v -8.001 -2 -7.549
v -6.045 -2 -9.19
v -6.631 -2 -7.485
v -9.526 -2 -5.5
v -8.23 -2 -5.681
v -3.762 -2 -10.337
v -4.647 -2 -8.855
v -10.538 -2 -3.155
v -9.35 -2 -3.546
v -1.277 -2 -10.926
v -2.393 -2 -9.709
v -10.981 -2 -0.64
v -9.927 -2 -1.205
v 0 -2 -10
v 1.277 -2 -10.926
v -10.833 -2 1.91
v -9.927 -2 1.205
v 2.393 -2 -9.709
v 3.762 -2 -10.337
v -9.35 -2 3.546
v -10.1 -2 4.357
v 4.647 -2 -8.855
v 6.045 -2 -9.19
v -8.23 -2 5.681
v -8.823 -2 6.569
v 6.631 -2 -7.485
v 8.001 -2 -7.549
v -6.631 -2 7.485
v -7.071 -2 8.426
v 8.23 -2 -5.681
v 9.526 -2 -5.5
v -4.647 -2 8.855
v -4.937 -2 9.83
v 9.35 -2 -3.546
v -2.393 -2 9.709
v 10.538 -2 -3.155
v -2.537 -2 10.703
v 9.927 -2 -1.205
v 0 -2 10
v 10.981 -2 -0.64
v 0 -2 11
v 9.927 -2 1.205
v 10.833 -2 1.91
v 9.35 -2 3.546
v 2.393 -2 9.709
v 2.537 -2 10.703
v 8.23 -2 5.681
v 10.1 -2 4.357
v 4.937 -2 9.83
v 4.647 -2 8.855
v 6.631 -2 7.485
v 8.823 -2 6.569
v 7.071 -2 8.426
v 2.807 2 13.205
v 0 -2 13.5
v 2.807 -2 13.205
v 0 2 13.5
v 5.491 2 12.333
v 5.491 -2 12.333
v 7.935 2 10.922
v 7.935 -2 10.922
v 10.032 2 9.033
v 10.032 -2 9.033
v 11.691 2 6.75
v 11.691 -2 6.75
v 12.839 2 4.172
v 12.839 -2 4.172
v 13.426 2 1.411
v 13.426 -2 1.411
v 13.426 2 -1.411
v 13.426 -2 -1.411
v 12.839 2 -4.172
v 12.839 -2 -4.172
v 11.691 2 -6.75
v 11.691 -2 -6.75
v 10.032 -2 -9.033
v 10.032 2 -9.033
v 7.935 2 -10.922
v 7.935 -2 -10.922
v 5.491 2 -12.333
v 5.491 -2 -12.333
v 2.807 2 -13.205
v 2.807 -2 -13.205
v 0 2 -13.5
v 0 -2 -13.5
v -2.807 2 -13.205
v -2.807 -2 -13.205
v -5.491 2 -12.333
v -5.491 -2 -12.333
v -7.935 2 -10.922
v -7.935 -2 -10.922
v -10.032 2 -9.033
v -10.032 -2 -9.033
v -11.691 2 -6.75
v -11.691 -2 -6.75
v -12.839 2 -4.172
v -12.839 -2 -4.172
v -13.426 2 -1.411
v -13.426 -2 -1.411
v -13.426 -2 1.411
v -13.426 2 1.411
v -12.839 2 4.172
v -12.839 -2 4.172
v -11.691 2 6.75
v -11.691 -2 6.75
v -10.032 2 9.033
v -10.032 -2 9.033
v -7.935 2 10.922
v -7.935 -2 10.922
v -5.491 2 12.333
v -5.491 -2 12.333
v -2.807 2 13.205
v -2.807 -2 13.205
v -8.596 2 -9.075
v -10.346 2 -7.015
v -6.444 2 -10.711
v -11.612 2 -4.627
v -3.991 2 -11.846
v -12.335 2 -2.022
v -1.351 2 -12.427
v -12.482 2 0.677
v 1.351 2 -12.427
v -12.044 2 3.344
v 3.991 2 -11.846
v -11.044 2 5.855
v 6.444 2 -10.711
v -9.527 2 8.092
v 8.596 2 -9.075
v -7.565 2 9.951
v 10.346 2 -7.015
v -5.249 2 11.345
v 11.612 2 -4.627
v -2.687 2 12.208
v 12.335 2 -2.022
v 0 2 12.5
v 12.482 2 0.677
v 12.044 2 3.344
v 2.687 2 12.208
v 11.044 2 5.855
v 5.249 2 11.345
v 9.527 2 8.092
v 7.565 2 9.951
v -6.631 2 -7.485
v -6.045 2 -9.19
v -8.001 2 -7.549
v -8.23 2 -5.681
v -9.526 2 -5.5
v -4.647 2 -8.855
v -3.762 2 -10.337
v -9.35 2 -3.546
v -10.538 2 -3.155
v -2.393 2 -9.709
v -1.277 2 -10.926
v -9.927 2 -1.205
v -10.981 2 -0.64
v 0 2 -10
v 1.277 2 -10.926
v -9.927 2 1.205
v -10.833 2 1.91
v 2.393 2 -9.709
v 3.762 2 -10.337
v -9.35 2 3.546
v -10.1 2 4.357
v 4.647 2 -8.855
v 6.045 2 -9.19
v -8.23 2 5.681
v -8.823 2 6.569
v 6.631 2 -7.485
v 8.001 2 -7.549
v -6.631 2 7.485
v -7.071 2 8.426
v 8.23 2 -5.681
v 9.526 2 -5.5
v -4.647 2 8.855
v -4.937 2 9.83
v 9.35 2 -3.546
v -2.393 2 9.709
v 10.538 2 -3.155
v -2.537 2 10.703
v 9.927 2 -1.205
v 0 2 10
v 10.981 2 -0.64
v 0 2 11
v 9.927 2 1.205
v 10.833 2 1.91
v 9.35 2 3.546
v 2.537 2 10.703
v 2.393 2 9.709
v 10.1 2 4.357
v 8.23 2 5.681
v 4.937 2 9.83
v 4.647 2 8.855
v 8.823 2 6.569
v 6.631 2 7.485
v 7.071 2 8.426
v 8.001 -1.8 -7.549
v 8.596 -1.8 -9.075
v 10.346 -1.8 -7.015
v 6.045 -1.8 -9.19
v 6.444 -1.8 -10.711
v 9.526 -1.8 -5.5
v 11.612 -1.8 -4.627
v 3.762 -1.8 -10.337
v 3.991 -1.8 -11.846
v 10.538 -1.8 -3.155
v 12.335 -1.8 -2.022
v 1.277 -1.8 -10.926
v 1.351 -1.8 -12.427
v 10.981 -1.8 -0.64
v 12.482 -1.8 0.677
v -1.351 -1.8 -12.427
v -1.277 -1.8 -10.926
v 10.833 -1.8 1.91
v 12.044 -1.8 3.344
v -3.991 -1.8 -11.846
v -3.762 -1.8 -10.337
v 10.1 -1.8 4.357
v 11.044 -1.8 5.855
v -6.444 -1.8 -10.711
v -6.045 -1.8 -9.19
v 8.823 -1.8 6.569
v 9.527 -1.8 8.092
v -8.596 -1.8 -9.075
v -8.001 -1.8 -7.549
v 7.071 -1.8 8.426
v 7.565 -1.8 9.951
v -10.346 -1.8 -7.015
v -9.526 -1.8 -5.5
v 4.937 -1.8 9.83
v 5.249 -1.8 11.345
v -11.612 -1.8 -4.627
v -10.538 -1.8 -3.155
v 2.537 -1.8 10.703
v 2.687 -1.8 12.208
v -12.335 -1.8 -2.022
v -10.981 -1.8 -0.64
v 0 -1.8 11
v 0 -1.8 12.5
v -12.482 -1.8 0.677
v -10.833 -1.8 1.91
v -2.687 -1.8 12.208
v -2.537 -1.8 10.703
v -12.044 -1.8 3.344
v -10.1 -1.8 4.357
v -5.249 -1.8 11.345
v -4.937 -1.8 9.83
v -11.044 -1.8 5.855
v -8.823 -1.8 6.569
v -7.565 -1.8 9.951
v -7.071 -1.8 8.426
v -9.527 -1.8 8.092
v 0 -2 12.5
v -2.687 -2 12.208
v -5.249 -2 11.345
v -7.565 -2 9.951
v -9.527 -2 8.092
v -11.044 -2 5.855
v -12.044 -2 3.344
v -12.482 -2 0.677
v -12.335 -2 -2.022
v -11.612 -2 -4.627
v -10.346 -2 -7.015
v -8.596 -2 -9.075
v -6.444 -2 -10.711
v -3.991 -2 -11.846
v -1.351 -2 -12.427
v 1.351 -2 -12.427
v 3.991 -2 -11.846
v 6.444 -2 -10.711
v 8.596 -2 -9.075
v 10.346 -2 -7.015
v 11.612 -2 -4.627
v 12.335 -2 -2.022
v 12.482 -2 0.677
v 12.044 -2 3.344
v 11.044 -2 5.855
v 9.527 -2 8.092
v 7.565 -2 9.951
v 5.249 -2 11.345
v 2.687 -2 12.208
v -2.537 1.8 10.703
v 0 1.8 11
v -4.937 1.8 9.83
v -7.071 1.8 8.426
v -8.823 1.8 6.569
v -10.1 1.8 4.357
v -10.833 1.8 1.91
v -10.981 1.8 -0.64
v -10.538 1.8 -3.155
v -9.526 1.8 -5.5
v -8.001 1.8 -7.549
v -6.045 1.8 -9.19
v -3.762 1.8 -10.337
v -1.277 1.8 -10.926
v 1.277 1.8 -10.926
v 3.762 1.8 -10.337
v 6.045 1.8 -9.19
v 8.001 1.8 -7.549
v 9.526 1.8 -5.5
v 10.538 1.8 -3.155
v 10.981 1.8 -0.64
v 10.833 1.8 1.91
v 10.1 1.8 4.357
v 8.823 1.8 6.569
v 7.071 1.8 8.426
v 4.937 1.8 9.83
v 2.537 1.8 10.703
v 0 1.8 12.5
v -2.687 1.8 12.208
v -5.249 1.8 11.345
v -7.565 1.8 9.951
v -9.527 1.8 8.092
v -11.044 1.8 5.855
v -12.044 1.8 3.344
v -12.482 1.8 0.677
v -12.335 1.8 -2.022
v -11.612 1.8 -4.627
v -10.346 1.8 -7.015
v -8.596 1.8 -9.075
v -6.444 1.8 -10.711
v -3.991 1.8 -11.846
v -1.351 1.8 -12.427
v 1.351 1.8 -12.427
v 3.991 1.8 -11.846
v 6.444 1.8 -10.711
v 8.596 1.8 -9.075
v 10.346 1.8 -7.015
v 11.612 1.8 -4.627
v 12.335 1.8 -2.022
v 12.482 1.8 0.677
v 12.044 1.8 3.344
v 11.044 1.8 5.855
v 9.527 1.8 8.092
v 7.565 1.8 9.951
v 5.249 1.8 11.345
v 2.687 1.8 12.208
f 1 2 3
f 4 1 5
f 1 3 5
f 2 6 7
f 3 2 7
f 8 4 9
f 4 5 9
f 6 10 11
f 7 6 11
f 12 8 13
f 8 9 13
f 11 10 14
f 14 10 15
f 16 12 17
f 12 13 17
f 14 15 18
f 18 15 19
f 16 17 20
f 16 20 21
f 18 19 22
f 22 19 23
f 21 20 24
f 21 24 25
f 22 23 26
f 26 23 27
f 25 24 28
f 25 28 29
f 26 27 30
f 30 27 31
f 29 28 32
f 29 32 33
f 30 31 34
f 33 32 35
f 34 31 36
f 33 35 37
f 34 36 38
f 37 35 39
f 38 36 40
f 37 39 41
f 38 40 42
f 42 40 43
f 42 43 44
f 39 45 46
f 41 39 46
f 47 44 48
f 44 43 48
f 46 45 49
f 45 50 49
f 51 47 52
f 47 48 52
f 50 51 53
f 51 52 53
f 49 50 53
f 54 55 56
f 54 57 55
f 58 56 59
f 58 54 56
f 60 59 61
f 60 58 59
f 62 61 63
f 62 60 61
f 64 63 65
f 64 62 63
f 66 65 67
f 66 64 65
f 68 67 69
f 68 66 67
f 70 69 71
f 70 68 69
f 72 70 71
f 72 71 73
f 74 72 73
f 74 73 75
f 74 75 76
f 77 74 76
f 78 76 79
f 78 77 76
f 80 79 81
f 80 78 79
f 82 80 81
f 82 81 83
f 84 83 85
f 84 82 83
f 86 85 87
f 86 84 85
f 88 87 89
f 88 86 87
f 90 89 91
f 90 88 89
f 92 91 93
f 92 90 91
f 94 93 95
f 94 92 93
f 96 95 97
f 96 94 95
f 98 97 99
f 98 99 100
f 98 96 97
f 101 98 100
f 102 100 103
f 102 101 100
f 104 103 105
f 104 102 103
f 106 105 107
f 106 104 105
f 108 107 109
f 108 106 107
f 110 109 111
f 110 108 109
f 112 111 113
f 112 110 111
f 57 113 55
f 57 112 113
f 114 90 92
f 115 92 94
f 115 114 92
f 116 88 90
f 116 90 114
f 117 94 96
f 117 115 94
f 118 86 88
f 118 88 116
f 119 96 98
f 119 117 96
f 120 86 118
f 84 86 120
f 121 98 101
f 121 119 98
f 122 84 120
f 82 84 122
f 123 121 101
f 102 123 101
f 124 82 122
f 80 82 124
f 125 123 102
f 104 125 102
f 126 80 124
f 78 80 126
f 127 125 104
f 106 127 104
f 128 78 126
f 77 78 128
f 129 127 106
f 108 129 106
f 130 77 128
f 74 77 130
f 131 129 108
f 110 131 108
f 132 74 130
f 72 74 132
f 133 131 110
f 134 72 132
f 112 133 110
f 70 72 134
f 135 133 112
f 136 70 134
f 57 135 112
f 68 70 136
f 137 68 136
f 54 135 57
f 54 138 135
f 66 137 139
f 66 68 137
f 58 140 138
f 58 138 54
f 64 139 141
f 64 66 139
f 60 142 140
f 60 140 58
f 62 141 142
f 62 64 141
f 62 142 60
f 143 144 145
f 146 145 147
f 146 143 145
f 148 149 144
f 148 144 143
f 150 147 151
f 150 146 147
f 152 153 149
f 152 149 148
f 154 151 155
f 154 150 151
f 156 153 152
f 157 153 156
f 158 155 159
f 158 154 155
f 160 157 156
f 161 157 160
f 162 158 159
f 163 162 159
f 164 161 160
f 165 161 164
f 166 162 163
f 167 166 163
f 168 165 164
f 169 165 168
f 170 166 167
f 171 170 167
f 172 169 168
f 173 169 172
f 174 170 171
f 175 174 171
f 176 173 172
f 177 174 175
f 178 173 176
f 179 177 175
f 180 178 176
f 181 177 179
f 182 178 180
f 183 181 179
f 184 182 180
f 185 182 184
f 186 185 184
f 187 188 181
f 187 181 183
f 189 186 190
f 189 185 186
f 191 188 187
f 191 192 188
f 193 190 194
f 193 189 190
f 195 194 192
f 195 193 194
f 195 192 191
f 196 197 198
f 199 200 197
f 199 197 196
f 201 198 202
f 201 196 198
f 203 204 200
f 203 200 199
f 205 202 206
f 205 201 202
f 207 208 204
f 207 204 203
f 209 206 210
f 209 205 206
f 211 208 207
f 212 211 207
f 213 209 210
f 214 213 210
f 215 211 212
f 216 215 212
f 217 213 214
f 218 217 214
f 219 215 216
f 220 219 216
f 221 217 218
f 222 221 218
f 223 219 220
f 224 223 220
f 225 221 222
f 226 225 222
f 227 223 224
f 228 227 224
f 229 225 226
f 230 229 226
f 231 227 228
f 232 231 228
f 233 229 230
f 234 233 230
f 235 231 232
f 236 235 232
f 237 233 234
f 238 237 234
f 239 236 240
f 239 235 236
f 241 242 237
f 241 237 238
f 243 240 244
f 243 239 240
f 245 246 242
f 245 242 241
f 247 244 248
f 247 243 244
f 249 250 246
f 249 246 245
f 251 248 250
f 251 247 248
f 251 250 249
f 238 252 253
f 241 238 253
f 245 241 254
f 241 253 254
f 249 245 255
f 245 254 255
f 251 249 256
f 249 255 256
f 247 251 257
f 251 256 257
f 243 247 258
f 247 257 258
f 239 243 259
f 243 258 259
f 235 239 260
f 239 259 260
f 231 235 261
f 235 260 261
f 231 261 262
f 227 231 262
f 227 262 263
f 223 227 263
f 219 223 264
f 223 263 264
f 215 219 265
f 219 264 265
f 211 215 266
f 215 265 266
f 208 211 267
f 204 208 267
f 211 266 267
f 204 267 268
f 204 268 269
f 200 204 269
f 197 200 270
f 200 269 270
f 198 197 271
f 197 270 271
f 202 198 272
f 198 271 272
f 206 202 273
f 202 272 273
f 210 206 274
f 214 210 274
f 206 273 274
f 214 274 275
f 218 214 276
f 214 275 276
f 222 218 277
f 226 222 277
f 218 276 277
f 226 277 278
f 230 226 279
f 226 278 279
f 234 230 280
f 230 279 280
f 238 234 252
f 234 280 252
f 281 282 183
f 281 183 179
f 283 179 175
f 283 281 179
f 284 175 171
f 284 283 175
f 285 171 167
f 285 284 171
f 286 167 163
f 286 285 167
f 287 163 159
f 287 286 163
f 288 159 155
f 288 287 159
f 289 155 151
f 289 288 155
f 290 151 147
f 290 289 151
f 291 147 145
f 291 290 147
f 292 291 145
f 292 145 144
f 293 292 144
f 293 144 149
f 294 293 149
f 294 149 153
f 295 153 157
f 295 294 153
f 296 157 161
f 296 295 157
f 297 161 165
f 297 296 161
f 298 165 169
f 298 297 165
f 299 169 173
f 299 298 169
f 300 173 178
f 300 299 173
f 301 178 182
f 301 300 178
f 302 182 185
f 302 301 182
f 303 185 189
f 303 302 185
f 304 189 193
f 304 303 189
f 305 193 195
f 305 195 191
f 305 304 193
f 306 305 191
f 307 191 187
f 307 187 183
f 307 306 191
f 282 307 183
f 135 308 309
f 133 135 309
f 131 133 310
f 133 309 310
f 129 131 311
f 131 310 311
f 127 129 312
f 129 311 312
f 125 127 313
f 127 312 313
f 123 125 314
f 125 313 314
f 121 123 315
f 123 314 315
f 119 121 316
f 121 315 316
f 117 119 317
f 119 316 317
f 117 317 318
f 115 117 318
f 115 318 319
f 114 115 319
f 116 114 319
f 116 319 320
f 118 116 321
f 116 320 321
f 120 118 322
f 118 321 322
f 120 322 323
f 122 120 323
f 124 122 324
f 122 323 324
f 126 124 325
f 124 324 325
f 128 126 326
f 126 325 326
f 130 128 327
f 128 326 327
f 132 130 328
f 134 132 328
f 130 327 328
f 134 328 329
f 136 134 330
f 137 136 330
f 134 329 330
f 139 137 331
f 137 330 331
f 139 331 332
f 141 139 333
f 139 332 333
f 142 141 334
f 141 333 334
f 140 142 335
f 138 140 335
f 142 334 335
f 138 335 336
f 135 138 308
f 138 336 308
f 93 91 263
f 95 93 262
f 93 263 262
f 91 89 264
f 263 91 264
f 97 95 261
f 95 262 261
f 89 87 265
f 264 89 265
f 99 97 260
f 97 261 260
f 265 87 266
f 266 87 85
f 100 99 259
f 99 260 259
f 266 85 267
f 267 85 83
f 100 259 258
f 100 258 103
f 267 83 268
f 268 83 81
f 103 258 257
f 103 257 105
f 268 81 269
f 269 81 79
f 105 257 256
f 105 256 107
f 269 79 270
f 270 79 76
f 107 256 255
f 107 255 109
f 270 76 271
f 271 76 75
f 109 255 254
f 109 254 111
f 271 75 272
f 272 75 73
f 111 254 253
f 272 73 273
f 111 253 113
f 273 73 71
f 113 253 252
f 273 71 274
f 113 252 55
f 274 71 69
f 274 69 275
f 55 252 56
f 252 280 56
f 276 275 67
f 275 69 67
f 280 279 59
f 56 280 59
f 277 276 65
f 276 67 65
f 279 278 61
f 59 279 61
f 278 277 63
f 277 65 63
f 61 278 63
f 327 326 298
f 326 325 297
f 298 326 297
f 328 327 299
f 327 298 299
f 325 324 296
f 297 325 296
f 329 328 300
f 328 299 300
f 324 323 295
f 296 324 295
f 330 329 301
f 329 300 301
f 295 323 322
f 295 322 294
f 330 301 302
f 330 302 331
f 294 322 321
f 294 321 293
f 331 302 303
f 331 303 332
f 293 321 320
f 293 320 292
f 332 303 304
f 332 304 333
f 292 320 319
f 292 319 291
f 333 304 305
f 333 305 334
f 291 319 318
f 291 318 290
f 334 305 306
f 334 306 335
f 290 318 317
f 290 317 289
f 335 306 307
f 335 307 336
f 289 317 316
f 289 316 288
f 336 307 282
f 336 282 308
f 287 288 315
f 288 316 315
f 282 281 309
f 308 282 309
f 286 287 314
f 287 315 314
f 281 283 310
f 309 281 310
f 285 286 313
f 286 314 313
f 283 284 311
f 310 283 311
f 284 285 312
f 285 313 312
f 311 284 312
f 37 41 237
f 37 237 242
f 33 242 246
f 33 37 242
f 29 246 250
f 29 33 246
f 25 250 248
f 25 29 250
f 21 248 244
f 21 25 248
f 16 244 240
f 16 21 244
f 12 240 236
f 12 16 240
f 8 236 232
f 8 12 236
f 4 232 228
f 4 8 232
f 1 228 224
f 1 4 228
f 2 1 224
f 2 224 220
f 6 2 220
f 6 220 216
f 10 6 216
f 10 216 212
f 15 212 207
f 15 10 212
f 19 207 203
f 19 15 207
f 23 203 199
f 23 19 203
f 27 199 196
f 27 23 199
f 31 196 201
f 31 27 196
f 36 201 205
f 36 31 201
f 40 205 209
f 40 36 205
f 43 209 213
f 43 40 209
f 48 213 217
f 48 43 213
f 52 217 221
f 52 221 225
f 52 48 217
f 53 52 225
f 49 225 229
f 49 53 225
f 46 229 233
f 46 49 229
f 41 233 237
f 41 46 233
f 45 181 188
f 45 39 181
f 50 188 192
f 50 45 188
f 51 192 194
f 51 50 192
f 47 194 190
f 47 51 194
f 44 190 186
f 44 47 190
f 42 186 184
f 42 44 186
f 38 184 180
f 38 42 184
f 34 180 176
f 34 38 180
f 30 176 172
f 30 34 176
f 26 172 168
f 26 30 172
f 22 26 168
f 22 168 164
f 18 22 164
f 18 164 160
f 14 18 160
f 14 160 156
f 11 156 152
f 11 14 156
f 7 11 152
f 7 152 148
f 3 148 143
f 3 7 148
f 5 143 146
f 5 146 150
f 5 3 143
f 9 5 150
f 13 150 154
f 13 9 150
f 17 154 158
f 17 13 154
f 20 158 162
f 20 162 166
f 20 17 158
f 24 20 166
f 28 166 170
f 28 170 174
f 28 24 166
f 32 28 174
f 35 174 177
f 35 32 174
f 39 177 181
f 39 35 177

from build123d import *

# Parameters (mm, degrees)
SKETCH1_R           = 13.5
SKETCH1_R_2         = 10
BOSS_EXTRUDE1_DEPTH = 2
CUT_EXTRUDE1_START  = 2
SKETCH2_R           = 12.5
SKETCH2_R_2         = 11
CUT_EXTRUDE1_DEPTH  = 0.2
CUT_EXTRUDE2_START  = -1.8
SKETCH2_2_R         = 12.5
SKETCH2_2_R_2       = 11
CUT_EXTRUDE2_DEPTH  = 0.2


with BuildPart() as part:
    # Sketch1 → Boss-Extrude1 (new, symmetric)
    with BuildSketch(Plane(origin=(0, 0, 0), x_dir=(1, 0, 0), z_dir=(0, 1, 0))):
        with Locations(Location((0, 0, 0), (0, 0, 270))):
            Circle(SKETCH1_R)
        with Locations(Location((0, 0, 0), (0, 0, 270))):
            Circle(SKETCH1_R_2, mode=Mode.SUBTRACT)
    extrude(amount=BOSS_EXTRUDE1_DEPTH, both=True)

    # Sketch2 → Cut-Extrude1 (cut)
    with BuildSketch(Plane.XZ.offset(CUT_EXTRUDE1_START)):
        with Locations(Location((0, 0, 0), (0, 0, 90))):
            Circle(SKETCH2_R)
        with Locations(Location((0, 0, 0), (0, 0, 90))):
            Circle(SKETCH2_R_2, mode=Mode.SUBTRACT)
    extrude(amount=-CUT_EXTRUDE1_DEPTH, mode=Mode.SUBTRACT)

    # Sketch2<2> → Cut-Extrude2 (cut)
    with BuildSketch(Plane.XZ.offset(CUT_EXTRUDE2_START)):
        with Locations(Location((0, 0, 0), (0, 0, 90))):
            Circle(SKETCH2_2_R)
        with Locations(Location((0, 0, 0), (0, 0, 90))):
            Circle(SKETCH2_2_R_2, mode=Mode.SUBTRACT)
    extrude(amount=-CUT_EXTRUDE2_DEPTH, mode=Mode.SUBTRACT)


solid = part.part
